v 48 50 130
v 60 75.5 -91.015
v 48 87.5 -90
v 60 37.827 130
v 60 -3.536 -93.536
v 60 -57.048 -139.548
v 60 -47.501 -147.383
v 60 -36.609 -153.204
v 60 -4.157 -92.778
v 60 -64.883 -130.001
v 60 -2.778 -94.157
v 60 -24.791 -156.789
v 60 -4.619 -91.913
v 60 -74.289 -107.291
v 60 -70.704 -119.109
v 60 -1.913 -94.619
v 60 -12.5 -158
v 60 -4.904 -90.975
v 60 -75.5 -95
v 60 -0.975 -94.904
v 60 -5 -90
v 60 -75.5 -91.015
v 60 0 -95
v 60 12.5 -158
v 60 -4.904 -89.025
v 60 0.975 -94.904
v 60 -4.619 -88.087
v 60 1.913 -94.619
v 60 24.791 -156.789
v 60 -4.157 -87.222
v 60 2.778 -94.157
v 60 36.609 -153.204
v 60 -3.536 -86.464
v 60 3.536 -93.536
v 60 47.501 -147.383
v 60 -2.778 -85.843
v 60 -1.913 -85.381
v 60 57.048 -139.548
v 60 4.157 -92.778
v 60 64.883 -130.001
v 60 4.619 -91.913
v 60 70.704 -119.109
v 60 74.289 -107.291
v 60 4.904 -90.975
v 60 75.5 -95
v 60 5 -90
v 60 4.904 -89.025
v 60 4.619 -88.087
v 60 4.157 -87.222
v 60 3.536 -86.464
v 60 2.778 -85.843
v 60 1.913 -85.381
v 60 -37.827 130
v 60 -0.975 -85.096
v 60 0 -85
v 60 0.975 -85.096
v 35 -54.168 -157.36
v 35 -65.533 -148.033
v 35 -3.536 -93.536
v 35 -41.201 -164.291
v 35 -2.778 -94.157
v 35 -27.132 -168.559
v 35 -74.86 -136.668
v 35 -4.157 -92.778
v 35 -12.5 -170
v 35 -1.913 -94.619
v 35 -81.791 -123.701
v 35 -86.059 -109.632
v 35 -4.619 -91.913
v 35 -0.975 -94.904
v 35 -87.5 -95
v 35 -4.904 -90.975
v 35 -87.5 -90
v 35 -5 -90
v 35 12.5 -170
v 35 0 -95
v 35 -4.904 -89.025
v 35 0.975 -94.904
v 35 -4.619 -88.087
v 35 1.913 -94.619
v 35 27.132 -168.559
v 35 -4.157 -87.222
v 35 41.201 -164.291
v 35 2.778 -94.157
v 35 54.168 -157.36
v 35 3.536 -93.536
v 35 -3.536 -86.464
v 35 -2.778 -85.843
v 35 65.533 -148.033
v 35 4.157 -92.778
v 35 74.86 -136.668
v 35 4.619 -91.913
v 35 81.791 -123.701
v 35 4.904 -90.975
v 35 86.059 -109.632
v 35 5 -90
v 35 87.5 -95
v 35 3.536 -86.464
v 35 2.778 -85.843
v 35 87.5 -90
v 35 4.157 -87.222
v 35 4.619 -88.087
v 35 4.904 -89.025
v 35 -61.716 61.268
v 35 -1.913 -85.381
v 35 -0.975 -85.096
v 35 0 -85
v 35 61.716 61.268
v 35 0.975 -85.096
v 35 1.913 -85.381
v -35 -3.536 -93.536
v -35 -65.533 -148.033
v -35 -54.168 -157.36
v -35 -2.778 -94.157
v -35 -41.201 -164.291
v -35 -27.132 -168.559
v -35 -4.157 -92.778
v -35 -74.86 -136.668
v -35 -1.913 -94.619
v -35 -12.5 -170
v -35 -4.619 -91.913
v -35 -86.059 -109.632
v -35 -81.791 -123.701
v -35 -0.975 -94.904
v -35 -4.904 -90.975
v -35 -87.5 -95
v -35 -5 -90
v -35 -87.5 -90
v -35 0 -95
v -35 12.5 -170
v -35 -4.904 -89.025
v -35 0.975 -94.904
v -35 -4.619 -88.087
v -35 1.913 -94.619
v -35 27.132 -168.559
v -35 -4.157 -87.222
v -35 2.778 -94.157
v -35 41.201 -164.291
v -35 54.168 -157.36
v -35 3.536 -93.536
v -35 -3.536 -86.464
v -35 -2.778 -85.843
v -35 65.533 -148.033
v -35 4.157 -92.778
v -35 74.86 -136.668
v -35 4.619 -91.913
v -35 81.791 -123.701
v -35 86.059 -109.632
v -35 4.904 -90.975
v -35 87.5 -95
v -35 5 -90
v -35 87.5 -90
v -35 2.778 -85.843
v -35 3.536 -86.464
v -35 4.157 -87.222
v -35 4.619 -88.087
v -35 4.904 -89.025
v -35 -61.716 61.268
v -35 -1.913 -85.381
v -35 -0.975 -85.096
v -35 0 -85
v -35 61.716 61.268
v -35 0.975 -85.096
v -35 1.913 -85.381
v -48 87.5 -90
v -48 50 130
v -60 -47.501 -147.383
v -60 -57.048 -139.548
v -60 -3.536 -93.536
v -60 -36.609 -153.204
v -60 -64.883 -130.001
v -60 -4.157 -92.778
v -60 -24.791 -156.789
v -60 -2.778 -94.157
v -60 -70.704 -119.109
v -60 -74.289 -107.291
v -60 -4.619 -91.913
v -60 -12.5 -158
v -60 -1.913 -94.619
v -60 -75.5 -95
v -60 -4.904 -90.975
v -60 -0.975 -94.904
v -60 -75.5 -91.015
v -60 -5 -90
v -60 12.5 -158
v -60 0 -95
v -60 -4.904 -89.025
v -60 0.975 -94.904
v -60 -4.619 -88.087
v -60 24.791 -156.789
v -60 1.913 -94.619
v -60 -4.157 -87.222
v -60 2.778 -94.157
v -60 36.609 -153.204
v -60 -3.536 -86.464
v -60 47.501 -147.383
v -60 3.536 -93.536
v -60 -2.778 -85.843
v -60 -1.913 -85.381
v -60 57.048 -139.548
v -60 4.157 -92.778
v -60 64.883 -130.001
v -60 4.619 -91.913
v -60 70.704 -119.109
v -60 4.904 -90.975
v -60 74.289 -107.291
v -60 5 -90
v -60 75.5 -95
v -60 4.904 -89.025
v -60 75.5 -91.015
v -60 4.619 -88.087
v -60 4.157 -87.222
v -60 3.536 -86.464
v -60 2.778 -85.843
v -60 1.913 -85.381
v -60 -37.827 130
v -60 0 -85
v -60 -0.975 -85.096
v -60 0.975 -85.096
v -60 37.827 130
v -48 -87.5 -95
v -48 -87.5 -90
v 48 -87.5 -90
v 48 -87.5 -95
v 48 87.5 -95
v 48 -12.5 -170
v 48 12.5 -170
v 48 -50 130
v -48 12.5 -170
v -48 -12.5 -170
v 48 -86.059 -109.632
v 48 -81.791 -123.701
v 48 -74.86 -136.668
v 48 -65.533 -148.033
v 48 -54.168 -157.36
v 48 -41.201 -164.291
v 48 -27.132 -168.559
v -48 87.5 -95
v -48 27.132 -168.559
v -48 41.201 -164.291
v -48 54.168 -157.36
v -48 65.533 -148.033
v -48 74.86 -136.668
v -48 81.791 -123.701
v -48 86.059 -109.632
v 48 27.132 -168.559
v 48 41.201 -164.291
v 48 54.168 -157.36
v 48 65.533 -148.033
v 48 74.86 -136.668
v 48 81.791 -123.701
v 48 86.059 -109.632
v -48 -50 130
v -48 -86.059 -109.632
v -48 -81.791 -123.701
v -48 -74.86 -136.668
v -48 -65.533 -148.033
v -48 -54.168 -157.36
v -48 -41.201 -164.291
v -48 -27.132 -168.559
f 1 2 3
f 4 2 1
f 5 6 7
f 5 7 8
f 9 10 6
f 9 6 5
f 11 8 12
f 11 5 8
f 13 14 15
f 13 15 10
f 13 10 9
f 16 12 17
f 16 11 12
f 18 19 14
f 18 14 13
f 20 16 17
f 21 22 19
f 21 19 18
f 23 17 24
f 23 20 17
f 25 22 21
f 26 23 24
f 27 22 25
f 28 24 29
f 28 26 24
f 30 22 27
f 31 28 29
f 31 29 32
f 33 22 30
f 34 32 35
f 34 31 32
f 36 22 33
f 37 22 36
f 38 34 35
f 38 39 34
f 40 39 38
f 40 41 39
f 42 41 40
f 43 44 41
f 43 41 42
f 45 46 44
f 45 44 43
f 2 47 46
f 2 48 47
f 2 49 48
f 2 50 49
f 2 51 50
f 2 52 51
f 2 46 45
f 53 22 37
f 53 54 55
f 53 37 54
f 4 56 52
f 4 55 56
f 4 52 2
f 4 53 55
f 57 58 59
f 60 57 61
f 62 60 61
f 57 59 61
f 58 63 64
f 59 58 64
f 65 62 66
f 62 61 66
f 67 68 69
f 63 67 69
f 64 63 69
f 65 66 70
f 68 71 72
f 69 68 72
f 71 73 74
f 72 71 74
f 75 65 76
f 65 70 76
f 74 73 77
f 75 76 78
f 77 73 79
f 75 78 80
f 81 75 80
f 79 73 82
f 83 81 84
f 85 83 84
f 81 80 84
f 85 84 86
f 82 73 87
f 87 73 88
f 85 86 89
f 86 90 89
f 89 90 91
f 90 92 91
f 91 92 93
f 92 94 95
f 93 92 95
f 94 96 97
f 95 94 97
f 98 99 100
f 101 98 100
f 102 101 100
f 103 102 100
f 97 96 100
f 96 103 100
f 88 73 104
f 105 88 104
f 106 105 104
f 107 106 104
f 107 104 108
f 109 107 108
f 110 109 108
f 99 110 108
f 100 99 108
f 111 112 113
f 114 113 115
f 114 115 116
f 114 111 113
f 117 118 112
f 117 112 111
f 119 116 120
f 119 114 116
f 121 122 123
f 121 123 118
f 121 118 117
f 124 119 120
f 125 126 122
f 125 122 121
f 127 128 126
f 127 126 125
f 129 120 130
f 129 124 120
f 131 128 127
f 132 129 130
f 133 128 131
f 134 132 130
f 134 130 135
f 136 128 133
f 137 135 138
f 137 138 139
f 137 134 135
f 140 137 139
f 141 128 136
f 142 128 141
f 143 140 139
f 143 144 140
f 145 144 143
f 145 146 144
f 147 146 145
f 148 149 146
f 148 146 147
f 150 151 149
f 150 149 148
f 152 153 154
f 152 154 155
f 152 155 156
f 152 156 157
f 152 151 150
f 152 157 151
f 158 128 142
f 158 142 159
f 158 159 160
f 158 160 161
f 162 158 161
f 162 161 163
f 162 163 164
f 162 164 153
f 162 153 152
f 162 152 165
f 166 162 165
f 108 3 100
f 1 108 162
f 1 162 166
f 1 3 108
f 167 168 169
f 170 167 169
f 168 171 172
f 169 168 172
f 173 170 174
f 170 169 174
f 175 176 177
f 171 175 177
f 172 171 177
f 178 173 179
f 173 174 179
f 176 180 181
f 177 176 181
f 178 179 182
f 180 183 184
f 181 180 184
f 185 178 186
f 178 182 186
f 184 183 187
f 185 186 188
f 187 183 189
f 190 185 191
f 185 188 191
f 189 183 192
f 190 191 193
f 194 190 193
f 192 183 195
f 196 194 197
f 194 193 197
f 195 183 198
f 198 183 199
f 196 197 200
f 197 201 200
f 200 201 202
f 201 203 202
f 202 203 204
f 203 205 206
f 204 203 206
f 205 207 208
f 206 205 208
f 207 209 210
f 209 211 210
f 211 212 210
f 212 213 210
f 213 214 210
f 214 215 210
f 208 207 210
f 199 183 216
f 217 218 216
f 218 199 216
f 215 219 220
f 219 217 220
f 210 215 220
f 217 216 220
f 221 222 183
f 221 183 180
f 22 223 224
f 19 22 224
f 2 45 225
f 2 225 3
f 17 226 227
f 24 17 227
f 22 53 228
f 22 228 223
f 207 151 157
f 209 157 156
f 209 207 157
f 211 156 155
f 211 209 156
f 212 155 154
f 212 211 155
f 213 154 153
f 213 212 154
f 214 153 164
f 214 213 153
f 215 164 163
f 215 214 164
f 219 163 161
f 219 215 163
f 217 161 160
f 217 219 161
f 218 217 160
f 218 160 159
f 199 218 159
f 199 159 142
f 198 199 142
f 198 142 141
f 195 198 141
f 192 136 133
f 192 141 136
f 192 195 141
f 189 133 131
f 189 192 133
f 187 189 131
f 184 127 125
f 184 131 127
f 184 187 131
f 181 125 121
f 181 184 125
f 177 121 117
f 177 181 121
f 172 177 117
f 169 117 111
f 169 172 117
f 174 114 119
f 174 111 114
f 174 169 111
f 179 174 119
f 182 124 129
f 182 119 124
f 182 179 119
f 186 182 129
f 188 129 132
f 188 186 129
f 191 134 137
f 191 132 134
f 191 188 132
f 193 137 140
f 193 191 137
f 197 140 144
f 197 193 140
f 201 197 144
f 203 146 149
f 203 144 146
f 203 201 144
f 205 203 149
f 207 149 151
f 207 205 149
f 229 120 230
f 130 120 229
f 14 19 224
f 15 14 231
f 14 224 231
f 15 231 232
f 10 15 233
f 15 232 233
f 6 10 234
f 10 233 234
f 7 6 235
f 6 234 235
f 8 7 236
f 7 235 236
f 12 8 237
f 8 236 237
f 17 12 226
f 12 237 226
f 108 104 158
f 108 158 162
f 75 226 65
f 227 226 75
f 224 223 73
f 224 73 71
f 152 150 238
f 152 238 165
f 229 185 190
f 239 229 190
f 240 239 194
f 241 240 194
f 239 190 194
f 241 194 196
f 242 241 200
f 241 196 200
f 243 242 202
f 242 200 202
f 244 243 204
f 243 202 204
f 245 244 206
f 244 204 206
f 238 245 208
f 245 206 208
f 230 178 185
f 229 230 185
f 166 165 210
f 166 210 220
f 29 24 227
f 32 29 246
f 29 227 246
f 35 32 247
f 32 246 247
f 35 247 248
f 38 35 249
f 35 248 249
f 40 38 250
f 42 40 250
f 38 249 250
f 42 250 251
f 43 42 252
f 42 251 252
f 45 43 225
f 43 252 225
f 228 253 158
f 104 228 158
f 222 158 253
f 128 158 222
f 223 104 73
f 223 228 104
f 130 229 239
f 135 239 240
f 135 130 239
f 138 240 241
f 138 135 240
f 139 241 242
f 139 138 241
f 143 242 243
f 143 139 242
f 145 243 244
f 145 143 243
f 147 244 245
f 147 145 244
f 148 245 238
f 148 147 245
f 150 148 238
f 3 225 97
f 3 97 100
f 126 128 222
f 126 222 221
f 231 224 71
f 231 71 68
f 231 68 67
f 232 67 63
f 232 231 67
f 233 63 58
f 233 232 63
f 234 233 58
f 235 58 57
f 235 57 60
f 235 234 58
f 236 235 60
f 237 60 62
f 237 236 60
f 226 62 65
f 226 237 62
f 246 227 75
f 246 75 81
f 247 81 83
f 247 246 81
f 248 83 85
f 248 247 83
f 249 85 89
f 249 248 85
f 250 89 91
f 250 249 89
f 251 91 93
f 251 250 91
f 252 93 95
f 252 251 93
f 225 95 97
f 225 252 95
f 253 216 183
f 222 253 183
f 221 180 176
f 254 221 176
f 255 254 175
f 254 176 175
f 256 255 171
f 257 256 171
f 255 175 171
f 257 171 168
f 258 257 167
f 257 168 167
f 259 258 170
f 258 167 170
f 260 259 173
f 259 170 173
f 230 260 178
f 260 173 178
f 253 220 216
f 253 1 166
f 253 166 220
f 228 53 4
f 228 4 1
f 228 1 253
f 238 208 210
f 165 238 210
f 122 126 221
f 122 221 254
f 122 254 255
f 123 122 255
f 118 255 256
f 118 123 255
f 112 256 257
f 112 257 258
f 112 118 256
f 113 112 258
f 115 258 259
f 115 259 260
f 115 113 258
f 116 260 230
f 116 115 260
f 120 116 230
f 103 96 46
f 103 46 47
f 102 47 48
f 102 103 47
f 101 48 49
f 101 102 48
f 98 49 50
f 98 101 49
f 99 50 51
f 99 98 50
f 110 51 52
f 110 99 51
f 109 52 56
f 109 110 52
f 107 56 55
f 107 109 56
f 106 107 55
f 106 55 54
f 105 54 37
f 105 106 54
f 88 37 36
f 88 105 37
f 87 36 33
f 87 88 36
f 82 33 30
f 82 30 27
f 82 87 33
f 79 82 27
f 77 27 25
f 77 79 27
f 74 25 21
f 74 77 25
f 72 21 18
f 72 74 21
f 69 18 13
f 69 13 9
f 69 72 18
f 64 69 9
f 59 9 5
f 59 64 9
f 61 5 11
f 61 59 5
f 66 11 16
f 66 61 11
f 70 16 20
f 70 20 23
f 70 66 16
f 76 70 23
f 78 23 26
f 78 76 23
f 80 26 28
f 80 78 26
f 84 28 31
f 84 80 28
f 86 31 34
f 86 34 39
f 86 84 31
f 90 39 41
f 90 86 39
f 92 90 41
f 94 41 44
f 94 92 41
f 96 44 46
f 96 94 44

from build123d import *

# Parameters (mm, degrees)
F0_R     = 5
F1_DEPTH = 60
F3_W     = 226.6252040863
F3_H     = 197.2780163714
F3_H_2   = 59.4672214857
F4_DEPTH = 35
F5_R     = 75
F6_SIZE  = 12


# Not quite as in the source:
# - a feature names something its author has since deleted; it is built from what else it names


with BuildPart() as f1:
    # F0 (on Right) → F1 (new body, symmetric)
    with BuildSketch(Plane.YZ):
        Polygon((-87.5, -90), (-87.5, -170), (87.5, -170), (87.5, -90), (50, 130), (-50, 130), align=None)
        with Locations((0, -90)):
            Circle(F0_R, mode=Mode.SUBTRACT)
    extrude(amount=F1_DEPTH, both=True)

    # F3 (on face) → F4 (cut, symmetric)
    with BuildSketch(Plane.YZ):
        with Locations((-5.2212774754, -37.3711218749)):
            Rectangle(F3_W, F3_H)
        with Locations((-5.2212774754, -165.7437408035)):
            Rectangle(F3_W, F3_H_2)
    extrude(amount=F4_DEPTH, both=True, mode=Mode.SUBTRACT)

    # F5
    f5_edges = [f1.edges().sort_by_distance(p)[0] for p in [
        (-47.5, 87.5, -170),
        (47.5, 87.5, -170),
        (47.5, -87.5, -170),
        (-47.5, -87.5, -170),
    ]]
    fillet(f5_edges, radius=F5_R)

    # F6
    f6_edges = [f1.edges().sort_by_distance(p)[0] for p in [
        (60, 68.75, 20),
        (-60, 68.75, 20),
        (60, -65.533009, -148.033009),
        (60, -68.75, 20),
        (-60, -65.533009, -148.033009),
        (-60, -68.75, 20),
    ]]
    chamfer(f6_edges, length=F6_SIZE)


solid = f1.part
